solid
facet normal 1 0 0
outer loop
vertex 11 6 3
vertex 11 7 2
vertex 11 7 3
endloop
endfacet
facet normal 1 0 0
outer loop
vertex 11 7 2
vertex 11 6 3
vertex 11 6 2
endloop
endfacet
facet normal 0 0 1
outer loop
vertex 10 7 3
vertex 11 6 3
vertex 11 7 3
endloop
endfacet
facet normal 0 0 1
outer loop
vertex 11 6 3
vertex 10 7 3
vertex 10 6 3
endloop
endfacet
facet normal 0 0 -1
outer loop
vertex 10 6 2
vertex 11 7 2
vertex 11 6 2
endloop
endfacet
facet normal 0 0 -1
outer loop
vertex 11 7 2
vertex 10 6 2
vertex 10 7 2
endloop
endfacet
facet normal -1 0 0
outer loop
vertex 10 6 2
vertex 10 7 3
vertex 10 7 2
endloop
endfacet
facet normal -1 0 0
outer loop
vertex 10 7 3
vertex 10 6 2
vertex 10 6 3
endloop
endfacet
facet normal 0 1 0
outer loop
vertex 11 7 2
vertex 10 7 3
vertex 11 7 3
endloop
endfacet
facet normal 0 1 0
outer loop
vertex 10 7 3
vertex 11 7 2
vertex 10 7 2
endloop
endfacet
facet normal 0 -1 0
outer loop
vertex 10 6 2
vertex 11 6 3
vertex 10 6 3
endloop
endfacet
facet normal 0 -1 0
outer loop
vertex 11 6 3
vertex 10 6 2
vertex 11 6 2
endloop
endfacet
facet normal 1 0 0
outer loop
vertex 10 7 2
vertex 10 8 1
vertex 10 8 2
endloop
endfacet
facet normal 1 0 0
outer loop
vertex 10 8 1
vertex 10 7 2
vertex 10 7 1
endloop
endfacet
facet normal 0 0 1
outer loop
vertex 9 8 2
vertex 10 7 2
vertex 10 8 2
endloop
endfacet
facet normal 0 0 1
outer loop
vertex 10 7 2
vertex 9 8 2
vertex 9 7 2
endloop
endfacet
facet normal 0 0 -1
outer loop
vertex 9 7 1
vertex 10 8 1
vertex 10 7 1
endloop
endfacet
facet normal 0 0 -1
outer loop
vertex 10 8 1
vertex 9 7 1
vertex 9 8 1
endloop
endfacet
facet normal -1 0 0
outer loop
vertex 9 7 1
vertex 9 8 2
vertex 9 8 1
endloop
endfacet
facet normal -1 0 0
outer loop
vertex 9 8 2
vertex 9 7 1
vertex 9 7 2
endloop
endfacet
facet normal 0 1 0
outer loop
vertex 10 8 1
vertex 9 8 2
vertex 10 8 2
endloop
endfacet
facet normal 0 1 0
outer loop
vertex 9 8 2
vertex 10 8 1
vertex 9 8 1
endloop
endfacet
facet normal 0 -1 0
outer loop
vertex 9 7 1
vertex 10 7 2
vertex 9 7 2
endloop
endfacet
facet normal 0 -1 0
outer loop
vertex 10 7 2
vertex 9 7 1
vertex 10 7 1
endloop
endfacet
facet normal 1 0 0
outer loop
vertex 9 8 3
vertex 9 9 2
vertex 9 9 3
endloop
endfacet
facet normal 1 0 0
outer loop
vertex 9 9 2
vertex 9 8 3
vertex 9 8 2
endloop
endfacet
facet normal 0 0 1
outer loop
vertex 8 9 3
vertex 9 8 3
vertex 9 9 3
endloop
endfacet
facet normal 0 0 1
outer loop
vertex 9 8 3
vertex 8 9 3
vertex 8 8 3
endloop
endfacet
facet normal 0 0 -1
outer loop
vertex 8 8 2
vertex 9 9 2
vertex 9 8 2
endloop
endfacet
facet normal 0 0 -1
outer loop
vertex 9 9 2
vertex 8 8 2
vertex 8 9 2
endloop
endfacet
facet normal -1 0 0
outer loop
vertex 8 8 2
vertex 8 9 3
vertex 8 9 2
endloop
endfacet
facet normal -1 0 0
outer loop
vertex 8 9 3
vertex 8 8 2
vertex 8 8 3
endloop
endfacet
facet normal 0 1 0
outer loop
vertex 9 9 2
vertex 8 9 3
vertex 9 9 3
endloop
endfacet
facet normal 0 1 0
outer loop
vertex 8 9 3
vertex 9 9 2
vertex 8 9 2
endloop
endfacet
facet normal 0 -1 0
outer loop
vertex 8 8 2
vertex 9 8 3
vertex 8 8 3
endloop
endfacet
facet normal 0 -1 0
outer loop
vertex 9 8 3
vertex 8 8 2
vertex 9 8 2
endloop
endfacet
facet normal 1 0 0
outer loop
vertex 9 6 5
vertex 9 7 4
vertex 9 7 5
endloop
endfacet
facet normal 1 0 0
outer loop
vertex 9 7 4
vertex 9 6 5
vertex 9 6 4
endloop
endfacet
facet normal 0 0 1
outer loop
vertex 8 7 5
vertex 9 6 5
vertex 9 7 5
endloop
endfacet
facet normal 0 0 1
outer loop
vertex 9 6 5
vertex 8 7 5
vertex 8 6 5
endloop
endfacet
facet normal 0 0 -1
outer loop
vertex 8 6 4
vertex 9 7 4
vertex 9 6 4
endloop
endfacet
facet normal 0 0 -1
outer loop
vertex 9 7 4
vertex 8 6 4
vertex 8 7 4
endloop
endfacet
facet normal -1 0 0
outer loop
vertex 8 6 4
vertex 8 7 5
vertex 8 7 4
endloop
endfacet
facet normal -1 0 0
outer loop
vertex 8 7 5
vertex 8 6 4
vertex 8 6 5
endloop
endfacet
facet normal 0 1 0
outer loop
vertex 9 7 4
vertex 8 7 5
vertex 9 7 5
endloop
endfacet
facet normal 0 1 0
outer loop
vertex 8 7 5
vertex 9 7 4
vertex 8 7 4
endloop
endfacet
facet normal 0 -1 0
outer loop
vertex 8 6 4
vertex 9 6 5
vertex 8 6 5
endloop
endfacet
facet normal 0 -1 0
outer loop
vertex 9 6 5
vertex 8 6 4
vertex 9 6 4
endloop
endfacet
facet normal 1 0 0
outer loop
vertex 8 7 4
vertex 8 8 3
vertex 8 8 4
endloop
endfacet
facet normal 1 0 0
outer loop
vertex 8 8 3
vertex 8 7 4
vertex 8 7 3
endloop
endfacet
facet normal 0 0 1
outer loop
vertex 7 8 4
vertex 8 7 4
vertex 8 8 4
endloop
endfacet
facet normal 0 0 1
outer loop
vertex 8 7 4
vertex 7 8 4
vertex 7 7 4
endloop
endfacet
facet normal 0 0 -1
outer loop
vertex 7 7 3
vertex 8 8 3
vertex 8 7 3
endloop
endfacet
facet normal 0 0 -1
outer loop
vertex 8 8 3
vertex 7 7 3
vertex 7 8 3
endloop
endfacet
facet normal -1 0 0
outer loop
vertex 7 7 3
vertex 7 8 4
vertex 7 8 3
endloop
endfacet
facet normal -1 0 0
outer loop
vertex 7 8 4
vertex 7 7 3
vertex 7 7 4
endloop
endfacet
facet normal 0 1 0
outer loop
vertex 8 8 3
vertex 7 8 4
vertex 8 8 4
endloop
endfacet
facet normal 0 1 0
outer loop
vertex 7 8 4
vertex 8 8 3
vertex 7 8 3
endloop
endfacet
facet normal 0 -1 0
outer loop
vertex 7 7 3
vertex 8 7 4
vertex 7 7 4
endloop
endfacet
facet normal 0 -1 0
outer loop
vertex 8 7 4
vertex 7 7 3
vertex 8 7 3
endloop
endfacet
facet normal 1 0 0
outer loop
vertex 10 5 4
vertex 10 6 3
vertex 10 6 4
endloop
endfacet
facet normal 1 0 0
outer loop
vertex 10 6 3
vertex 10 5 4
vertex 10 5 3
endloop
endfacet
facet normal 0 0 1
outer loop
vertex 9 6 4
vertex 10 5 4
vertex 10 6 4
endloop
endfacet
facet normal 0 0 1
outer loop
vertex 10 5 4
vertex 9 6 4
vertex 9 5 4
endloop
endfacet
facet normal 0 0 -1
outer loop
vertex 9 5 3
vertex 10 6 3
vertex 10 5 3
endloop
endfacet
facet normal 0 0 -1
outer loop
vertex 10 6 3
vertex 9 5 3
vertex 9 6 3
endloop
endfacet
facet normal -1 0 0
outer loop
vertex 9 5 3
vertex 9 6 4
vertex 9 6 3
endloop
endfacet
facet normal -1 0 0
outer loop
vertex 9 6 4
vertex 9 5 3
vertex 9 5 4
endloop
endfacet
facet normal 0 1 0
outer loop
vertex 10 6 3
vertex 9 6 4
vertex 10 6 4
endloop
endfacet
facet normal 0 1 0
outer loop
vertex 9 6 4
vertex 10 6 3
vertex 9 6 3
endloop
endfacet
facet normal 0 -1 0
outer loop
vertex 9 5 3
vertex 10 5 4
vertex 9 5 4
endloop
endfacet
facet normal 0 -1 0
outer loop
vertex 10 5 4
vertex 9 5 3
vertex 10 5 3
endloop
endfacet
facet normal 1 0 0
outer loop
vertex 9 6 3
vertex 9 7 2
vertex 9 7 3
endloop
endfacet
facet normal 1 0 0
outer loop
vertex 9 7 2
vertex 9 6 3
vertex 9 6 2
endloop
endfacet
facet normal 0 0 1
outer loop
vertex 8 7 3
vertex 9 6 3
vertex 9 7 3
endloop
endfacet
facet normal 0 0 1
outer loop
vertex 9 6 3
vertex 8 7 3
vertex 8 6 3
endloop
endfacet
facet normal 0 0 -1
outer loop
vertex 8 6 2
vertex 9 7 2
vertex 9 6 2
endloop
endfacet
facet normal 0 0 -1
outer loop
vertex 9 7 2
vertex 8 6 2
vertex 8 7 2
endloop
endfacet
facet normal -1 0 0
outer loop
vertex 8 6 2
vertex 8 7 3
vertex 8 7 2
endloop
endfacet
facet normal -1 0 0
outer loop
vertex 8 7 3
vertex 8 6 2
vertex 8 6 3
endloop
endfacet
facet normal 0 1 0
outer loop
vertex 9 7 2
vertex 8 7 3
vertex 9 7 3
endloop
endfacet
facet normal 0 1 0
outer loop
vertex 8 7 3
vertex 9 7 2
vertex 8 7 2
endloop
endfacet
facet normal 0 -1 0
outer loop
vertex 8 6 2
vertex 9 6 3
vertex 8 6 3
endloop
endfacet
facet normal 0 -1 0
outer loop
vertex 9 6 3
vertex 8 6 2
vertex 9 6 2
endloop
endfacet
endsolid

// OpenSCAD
module space ()
{
  translate([10, 6, 2]) { cube(1); };
  translate([9, 7, 1]) { cube(1); };
  translate([8, 8, 2]) { cube(1); };
  translate([8, 6, 4]) { cube(1); };
  translate([7, 7, 3]) { cube(1); };
  translate([9, 5, 3]) { cube(1); };
  translate([8, 6, 2]) { cube(1); };
}

space();
